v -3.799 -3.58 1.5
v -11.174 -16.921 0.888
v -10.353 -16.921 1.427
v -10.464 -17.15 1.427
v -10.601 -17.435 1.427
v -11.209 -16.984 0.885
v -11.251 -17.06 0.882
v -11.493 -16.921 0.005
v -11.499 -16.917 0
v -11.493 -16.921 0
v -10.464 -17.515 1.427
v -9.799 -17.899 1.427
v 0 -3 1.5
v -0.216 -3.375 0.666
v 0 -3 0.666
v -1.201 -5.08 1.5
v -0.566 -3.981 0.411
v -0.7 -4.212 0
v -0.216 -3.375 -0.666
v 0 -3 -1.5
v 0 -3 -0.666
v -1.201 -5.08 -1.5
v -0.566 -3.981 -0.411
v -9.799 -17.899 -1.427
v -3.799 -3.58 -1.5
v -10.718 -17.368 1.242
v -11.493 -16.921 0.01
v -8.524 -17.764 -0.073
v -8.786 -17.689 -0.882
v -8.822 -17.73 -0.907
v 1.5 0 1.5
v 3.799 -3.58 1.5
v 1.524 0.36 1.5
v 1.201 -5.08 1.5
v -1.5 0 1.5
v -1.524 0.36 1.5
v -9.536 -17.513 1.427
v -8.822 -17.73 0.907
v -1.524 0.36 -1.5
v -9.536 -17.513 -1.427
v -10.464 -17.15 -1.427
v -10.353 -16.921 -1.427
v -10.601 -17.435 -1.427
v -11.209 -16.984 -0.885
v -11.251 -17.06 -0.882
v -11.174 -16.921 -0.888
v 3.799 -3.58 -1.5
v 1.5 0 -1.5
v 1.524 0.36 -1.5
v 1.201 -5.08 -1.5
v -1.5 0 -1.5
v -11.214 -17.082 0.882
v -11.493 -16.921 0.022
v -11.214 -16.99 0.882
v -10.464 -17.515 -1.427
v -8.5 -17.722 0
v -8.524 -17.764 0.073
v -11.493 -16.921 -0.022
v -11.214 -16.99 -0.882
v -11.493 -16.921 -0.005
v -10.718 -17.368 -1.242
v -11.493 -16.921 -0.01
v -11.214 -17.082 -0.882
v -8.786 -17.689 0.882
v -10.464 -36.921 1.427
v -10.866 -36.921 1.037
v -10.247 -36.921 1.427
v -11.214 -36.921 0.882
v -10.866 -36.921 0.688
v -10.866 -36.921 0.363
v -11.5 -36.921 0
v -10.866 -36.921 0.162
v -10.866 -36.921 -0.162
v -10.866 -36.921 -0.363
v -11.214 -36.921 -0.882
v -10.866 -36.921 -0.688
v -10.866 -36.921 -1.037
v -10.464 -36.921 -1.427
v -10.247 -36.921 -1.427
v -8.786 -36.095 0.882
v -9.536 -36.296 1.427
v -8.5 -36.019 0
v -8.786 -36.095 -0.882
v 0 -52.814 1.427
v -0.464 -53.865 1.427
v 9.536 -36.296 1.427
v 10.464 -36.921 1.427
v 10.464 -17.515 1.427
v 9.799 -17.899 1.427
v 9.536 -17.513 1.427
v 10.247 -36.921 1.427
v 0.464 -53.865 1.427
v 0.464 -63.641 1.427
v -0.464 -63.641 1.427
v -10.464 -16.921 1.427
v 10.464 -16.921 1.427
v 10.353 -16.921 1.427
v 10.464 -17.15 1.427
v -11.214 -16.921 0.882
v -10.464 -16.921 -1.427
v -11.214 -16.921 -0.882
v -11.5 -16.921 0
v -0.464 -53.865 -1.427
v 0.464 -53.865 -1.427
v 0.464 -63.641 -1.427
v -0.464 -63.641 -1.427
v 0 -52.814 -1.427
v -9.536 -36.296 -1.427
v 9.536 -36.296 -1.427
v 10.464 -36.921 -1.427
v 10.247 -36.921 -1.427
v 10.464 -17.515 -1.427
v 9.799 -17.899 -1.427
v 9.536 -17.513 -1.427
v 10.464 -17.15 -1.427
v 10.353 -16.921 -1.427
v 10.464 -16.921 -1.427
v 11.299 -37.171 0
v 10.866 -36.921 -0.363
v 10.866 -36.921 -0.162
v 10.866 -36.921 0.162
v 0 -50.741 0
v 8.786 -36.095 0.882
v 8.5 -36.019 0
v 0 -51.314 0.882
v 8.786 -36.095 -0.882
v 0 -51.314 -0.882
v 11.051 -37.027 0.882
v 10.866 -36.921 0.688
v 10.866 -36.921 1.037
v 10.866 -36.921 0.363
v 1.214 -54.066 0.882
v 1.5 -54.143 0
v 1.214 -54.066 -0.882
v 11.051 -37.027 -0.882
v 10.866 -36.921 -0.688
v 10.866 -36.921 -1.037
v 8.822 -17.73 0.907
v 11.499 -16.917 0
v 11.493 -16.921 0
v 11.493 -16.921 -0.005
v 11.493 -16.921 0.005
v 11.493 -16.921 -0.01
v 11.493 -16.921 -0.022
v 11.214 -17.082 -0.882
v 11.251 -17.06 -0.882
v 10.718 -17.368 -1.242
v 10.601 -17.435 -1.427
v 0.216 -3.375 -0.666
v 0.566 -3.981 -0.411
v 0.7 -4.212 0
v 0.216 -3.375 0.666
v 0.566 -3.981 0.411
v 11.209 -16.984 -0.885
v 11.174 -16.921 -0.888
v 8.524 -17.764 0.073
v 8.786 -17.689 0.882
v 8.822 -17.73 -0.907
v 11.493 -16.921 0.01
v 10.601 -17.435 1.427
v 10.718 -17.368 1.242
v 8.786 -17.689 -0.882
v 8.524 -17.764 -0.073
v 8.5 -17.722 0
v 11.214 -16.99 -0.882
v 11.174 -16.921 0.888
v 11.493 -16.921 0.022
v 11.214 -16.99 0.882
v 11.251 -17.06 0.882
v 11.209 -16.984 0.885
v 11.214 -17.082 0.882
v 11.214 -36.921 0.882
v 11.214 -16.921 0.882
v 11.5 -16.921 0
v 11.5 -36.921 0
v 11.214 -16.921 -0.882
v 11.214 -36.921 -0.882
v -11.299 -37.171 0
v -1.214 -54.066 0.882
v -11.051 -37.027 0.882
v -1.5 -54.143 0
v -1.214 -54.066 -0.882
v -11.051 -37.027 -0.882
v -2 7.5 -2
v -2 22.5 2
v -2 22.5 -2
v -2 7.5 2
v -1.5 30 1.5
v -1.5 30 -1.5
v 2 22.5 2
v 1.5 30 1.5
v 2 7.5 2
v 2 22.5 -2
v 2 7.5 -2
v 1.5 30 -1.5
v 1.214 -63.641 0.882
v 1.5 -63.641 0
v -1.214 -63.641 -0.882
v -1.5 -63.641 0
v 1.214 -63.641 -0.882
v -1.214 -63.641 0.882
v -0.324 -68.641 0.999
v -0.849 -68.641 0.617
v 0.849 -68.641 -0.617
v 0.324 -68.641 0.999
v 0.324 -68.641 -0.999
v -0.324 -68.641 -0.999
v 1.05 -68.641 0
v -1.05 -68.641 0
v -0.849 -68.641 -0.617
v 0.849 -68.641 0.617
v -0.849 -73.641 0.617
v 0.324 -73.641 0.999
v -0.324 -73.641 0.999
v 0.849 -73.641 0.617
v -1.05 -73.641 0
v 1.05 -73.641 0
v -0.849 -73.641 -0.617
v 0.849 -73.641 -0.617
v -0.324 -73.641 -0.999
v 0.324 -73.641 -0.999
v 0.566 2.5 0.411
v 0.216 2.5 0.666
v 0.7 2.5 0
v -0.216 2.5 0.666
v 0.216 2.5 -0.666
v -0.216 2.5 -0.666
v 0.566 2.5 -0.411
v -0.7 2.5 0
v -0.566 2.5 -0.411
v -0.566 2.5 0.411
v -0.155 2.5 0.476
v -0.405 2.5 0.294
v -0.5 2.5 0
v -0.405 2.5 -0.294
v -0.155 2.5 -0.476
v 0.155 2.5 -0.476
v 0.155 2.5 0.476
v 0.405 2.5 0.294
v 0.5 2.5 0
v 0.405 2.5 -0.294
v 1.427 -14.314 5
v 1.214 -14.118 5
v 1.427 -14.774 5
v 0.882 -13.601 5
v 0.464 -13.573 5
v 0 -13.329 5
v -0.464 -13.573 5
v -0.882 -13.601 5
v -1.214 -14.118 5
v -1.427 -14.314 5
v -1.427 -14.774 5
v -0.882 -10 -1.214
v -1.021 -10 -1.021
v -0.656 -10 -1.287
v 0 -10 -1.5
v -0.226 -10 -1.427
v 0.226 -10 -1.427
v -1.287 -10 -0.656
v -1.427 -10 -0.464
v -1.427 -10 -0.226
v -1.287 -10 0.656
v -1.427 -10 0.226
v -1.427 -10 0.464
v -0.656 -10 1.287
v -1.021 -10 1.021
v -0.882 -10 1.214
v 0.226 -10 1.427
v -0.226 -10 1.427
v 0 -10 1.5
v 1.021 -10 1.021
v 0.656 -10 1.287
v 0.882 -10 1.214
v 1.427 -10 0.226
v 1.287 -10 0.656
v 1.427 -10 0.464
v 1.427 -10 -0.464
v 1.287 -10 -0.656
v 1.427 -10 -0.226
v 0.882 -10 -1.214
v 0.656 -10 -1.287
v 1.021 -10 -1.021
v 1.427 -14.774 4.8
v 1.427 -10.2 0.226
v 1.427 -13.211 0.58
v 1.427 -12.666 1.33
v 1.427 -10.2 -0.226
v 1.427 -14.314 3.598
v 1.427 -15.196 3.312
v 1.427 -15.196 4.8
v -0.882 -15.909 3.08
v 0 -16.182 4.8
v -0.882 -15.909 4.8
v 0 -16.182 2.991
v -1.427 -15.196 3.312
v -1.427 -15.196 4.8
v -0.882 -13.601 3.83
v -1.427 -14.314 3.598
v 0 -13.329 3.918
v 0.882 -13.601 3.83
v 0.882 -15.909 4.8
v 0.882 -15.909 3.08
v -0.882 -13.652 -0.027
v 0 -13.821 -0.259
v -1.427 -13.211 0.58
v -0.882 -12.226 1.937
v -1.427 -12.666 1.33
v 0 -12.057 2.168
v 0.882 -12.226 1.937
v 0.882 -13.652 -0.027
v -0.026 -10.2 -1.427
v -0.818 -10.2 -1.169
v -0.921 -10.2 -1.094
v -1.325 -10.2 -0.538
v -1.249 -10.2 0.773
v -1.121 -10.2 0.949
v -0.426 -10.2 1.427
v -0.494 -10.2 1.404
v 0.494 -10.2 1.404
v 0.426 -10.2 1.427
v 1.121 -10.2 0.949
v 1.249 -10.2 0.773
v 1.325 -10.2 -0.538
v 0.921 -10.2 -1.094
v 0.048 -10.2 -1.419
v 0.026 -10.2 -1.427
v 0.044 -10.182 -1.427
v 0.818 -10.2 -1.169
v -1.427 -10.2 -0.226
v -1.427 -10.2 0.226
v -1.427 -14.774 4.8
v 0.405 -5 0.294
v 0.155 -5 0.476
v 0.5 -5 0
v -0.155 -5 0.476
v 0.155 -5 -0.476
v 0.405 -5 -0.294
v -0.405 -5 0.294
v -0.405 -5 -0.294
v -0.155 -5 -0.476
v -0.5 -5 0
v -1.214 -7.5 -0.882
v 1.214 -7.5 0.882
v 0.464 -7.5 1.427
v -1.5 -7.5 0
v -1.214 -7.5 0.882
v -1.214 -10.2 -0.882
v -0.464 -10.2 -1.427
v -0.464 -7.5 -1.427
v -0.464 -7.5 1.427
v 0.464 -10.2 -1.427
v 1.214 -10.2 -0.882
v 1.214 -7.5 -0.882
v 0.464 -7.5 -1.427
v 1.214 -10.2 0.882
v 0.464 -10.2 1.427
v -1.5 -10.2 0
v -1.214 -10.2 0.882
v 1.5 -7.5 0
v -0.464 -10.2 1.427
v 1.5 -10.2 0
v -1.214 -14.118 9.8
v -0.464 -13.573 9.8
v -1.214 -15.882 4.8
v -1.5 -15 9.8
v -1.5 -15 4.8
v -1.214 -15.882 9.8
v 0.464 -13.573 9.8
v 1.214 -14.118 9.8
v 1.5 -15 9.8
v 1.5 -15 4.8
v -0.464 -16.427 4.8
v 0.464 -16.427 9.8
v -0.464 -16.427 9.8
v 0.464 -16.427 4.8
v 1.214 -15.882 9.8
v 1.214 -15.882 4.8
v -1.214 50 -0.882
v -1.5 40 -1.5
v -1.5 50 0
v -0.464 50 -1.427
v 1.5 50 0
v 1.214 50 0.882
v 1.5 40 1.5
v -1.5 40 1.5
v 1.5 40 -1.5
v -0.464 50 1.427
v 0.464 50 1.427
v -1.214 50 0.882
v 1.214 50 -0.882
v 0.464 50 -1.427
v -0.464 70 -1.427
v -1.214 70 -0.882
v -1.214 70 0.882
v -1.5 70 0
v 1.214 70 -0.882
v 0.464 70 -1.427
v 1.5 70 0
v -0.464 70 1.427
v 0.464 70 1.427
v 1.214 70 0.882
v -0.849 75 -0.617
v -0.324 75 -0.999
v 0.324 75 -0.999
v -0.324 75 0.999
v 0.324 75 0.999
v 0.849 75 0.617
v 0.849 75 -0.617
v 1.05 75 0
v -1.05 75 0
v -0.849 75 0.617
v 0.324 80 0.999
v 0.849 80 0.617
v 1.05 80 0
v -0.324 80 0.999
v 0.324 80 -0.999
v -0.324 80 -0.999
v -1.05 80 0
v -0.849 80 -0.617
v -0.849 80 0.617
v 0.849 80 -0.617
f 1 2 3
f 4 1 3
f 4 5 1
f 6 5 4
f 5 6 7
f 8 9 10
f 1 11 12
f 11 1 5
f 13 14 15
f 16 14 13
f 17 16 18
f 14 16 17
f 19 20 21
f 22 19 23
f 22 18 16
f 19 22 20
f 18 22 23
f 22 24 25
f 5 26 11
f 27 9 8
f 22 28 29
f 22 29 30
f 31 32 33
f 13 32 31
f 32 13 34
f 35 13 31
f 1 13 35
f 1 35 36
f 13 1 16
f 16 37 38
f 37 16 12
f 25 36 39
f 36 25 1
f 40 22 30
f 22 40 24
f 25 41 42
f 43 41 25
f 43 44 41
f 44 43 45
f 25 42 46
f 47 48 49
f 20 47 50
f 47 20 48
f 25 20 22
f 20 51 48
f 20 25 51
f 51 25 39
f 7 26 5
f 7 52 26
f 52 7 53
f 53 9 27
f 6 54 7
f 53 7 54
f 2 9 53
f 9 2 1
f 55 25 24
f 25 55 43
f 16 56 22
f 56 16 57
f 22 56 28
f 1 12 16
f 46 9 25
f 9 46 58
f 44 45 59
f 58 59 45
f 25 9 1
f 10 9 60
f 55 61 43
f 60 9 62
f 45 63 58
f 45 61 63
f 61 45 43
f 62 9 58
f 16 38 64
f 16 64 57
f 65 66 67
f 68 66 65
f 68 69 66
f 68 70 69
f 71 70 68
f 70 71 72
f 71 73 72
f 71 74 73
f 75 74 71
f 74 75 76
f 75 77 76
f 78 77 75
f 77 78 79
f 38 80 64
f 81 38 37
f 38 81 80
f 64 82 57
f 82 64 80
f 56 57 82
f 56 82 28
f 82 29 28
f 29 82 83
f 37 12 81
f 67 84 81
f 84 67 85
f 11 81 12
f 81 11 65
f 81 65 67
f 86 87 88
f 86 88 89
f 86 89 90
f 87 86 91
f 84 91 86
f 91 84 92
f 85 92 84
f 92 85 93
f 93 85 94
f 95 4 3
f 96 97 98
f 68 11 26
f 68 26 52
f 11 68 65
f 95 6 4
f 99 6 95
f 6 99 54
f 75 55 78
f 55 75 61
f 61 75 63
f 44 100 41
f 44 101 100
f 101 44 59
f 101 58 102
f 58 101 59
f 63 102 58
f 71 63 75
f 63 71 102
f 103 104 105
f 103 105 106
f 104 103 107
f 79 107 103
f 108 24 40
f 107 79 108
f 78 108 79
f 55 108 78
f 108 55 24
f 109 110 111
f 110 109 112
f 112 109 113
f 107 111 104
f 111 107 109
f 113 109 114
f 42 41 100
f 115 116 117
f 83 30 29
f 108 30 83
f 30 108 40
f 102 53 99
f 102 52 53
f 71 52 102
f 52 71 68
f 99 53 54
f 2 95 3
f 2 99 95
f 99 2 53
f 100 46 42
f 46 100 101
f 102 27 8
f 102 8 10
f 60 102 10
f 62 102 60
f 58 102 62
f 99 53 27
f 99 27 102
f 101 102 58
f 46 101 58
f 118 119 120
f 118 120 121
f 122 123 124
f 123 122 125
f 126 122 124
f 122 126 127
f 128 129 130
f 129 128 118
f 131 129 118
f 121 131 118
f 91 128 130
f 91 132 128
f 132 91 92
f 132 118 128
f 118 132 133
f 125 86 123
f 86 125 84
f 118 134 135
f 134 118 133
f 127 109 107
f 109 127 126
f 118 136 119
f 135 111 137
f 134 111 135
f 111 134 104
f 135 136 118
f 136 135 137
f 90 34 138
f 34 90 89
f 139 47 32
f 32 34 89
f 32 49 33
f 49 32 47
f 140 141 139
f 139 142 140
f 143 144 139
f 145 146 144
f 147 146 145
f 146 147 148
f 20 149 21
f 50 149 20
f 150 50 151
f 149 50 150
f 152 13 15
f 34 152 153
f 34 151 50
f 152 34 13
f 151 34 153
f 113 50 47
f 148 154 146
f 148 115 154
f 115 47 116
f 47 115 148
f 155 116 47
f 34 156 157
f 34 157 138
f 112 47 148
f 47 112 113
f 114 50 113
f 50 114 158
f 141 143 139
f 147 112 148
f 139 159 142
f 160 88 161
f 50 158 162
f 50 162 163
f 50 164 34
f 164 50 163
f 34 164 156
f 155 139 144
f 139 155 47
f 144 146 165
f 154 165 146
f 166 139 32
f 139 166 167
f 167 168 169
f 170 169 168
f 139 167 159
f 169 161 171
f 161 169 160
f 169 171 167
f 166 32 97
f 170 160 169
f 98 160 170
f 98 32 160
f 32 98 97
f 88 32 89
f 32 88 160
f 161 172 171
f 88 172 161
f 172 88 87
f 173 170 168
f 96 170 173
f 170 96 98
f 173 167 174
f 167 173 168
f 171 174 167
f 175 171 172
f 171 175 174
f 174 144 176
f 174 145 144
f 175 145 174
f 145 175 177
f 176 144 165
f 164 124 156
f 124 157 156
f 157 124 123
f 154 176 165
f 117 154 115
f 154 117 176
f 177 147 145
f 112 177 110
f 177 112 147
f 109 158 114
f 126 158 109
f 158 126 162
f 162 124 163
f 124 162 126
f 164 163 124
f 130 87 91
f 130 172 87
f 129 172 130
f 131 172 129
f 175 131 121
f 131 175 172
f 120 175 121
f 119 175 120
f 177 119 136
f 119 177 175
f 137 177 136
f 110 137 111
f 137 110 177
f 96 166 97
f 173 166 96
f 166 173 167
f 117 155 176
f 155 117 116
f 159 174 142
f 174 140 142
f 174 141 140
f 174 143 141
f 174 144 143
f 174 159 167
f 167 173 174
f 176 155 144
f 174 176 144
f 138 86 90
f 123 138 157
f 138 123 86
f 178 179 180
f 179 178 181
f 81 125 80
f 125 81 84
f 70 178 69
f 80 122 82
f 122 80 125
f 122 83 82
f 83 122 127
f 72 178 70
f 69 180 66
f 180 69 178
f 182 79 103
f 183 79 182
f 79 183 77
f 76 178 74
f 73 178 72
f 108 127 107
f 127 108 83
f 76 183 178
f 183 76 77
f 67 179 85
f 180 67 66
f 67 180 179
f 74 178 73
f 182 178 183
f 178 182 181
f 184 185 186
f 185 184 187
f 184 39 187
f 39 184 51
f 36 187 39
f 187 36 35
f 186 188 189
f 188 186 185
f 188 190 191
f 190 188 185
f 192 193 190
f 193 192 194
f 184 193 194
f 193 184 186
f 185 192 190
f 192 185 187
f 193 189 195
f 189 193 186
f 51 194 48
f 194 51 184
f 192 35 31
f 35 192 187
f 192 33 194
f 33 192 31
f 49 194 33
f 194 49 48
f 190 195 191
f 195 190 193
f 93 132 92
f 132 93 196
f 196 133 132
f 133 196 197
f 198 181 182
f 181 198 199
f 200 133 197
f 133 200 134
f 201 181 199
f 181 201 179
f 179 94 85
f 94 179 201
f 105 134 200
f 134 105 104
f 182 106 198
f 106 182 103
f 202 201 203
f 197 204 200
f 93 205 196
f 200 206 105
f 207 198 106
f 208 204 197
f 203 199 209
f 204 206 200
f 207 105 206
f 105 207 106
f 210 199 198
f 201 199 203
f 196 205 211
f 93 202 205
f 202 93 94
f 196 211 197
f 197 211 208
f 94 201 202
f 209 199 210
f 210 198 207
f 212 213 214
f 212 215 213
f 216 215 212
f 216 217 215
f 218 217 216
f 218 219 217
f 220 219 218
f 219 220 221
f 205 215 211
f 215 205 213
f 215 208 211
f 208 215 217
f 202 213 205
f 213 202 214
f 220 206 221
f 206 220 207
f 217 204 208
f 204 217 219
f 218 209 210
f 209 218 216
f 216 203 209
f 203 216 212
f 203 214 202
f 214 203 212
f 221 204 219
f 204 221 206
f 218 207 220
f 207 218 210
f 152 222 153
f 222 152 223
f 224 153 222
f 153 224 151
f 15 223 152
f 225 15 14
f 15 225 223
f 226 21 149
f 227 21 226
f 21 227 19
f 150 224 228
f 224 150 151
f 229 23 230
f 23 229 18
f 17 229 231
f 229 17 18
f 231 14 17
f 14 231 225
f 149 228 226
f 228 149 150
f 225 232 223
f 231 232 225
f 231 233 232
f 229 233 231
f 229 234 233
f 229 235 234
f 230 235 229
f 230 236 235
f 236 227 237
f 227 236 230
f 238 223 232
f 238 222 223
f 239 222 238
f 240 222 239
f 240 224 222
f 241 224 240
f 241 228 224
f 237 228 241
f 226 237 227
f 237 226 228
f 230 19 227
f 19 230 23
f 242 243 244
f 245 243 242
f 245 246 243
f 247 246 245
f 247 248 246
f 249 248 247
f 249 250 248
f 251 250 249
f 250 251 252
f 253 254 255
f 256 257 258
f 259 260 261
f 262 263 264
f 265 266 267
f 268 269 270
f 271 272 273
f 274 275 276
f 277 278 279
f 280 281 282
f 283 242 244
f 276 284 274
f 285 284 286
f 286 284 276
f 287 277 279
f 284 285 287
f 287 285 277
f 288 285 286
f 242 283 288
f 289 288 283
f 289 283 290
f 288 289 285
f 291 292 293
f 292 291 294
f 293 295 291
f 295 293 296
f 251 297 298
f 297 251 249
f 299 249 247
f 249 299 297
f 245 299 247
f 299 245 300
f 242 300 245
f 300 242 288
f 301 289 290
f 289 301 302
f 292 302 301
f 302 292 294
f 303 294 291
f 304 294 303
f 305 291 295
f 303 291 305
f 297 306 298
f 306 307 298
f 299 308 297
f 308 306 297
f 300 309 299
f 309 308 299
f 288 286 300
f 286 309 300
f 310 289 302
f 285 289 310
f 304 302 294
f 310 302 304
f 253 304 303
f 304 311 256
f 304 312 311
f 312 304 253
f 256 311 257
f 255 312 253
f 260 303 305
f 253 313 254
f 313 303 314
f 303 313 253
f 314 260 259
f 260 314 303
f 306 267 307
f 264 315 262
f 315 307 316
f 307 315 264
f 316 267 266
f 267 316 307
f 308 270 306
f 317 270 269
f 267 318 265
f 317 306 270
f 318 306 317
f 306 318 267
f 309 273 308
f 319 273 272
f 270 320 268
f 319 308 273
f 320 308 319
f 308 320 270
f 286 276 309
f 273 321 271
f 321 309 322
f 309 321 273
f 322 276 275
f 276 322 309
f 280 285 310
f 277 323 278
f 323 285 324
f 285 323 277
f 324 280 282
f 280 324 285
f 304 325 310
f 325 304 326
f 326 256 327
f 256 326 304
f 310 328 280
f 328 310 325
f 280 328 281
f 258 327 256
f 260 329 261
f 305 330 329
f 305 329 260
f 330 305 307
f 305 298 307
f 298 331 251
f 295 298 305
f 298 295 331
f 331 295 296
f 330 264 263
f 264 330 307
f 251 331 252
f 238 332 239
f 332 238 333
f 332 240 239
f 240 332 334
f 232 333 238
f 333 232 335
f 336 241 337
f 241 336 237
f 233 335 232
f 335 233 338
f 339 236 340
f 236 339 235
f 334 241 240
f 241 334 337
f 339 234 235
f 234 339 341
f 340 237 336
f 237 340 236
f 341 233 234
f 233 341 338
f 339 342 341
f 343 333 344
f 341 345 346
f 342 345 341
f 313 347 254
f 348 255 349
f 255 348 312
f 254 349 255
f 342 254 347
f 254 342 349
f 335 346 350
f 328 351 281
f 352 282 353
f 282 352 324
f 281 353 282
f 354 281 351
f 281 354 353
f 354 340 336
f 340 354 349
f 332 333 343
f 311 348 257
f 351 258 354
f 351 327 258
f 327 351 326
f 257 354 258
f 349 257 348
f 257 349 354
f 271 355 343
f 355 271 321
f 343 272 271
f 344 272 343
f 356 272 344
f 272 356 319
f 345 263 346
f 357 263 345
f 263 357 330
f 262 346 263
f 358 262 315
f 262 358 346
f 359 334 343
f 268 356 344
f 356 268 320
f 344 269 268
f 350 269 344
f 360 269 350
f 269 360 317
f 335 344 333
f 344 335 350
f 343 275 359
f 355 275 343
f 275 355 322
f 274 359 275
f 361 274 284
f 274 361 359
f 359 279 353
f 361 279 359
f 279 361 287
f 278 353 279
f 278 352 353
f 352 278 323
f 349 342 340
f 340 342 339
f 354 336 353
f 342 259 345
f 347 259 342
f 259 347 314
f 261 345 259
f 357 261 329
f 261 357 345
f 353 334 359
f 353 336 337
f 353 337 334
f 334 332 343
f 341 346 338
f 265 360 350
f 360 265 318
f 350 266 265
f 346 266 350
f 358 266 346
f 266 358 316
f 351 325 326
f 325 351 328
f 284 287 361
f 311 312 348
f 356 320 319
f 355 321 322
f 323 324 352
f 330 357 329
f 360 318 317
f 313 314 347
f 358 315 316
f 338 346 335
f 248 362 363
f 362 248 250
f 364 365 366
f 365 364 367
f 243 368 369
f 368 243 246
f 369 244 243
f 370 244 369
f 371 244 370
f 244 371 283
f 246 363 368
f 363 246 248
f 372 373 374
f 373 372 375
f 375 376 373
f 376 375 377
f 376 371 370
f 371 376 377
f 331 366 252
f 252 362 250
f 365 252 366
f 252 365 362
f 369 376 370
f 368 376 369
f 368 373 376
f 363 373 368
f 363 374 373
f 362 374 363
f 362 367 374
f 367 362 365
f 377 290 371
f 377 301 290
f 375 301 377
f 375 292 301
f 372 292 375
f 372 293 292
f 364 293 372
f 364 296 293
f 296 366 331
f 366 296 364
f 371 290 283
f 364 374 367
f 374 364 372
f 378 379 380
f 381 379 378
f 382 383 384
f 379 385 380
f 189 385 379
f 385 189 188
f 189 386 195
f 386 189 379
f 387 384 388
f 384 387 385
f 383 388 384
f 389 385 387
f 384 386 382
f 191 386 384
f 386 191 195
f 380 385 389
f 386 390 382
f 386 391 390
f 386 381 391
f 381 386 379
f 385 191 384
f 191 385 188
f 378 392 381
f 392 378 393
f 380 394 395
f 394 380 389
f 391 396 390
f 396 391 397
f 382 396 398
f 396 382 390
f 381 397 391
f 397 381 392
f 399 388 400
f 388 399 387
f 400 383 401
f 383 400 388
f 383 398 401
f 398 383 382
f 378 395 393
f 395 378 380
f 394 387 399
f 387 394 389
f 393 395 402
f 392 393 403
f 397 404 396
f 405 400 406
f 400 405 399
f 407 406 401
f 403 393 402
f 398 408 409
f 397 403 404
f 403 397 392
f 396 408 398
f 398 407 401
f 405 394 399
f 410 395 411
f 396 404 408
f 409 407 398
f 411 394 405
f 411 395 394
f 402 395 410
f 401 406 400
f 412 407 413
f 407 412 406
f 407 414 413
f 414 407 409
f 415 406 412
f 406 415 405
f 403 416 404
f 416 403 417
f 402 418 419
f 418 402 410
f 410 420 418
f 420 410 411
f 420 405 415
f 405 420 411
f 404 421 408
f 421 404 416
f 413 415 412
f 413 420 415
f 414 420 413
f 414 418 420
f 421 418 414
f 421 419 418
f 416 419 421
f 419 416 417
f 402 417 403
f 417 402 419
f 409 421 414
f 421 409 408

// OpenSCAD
$fn=10;
l_chan=40;
l_elb=20;
l_bet=20;
l_end=20;
l_conv=20;
l_out=30;
od=2.1;
module Flow_cyt_channel_simpler(l_chan=30, l_elb=20, l_bet=20, l_end=20, l_conv=20, l_out=20, od=2.1){
difference(){
    union (){
        
        //imaging channel
        
    translate ([0,l_chan/2,0]){ 
        hull(){
        cube([4,l_chan/2,4], center= true);
        translate([0,l_chan/4+l_chan/8,0]){
            cube([3,l_chan/4,3], center=true);
        }
        translate ([0,-l_chan/4-l_chan/8,0]){
            cube([3,l_chan/4,3], center=true);
        }
    }
    }
    
        //flow channels leading to the imaging channel
    
    for(x=[-30,30]){
    rotate ([0,0,x]){
        rotate([90,0,0]){
        hull(){
            translate ([0,0,l_elb/8]){
                cube ([3,3,l_elb/4], center    =true);
            }
            translate ([0,0,l_elb/2]){
                cylinder (d=3, h=l_elb/2+0.4);
            }
        }
        }

    }
    if (x<0){
        translate ([-l_elb/2,-l_elb*sqrt(3)/2+0.4,0]){
            rotate ([90,0,0]){
               cylinder (d=3, h=l_bet);
            }
        }
    }
    else{
         translate ([l_elb/2,-l_elb*sqrt(3)/2+0.4,0]){
            rotate ([90,0,0]){
                cylinder (d=3, h=l_bet);
            }
        }
    }
    translate ([0,-l_elb*sqrt(3)+0.9-l_bet,0]){
        rotate([0,0,x+180]){
            rotate ([90,0,0]){
                cylinder (d=3, h=l_elb);
            }
        }
    }
    }
    translate ([0,-l_elb*sqrt(3)-l_bet+1,0]){
        rotate ([90,0,0]){
            cylinder (d=3, h=l_end/4);
        }
    }
    hull(){
        translate ([0,-l_elb*sqrt(3)-l_bet+1-l_end/4,0]){
            rotate ([90,0,0]){
                cylinder (d=3, h=l_end/4);
            }
        }
        translate ([0,-l_elb*sqrt(3)-l_bet+1-l_end/2,0]){
            rotate ([90,0,0]){
                cylinder (d=od, h=l_end/4);
            }
        }
    }
    translate ([0,-l_elb*sqrt(3)-l_bet+1-l_end/2-l_end/4,0]){
        rotate ([90,0,0]){
            cylinder (d=od, h=l_end/4);
            }
        }
    
    
    
}

        //Inlet for the islets

    rotate ([90,0,0]){
        translate([0,0,5]){
        cylinder (d=1.4,h=15, center=true);
        }
    }
}
rotate ([90,0,0]){
    translate([0,0,5]){
        cylinder (d=1,h=15, center=true);
        }
    }
translate ([0,-10,5]){
        rotate([0,90,180]){
        intersection (){
    translate ([0,0,-1.5]){
        cube(10,10,3);
    }
    rotate_extrude(convexity=10)
    translate([5,0,0]){
        circle (r=1.5);
    }
}
}
}
rotate ([90,0,0]){
    hull(){
        translate([0,0,7.5]){
            cylinder (d=3,h=2.7);
        }
        translate([0,0,5]){
            cylinder (d=1,h=2.5);
        }
    }
        
}
translate ([0,-15,4.8]){
    cylinder (d=3, h=5);
}
    
        //channel leading out of image channel
    
hull(){
    translate([0,l_chan+l_conv/4,0]){
        cube([3,l_conv/2,3], center=true);
    }
    translate ([0,l_chan+l_conv/2,0]){
        rotate([-90,0,0]){
            cylinder(d=3,h=l_conv/2);
        }
    }
}
translate ([0,l_chan+l_conv,0]){
    rotate ([-90,0,0]){
        cylinder(d=3,h=l_out);
    }
}
hull(){
        translate ([0,l_chan+l_conv+l_out,0]){
            rotate ([90,0,0]){
                cylinder (d=3, h=l_end/4);
            }
        }
        translate ([0,l_chan+l_conv+l_out+l_end/4,0]){
            rotate ([90,0,0]){
                cylinder (d=od, h=l_end/4);
            }
        }
    }
    translate ([0,l_chan+l_conv+l_out+l_end/2,0]){
        rotate ([90,0,0]){
            cylinder (d=od, h=l_end/2);
            }
        }
}
Flow_cyt_channel_simpler ();
